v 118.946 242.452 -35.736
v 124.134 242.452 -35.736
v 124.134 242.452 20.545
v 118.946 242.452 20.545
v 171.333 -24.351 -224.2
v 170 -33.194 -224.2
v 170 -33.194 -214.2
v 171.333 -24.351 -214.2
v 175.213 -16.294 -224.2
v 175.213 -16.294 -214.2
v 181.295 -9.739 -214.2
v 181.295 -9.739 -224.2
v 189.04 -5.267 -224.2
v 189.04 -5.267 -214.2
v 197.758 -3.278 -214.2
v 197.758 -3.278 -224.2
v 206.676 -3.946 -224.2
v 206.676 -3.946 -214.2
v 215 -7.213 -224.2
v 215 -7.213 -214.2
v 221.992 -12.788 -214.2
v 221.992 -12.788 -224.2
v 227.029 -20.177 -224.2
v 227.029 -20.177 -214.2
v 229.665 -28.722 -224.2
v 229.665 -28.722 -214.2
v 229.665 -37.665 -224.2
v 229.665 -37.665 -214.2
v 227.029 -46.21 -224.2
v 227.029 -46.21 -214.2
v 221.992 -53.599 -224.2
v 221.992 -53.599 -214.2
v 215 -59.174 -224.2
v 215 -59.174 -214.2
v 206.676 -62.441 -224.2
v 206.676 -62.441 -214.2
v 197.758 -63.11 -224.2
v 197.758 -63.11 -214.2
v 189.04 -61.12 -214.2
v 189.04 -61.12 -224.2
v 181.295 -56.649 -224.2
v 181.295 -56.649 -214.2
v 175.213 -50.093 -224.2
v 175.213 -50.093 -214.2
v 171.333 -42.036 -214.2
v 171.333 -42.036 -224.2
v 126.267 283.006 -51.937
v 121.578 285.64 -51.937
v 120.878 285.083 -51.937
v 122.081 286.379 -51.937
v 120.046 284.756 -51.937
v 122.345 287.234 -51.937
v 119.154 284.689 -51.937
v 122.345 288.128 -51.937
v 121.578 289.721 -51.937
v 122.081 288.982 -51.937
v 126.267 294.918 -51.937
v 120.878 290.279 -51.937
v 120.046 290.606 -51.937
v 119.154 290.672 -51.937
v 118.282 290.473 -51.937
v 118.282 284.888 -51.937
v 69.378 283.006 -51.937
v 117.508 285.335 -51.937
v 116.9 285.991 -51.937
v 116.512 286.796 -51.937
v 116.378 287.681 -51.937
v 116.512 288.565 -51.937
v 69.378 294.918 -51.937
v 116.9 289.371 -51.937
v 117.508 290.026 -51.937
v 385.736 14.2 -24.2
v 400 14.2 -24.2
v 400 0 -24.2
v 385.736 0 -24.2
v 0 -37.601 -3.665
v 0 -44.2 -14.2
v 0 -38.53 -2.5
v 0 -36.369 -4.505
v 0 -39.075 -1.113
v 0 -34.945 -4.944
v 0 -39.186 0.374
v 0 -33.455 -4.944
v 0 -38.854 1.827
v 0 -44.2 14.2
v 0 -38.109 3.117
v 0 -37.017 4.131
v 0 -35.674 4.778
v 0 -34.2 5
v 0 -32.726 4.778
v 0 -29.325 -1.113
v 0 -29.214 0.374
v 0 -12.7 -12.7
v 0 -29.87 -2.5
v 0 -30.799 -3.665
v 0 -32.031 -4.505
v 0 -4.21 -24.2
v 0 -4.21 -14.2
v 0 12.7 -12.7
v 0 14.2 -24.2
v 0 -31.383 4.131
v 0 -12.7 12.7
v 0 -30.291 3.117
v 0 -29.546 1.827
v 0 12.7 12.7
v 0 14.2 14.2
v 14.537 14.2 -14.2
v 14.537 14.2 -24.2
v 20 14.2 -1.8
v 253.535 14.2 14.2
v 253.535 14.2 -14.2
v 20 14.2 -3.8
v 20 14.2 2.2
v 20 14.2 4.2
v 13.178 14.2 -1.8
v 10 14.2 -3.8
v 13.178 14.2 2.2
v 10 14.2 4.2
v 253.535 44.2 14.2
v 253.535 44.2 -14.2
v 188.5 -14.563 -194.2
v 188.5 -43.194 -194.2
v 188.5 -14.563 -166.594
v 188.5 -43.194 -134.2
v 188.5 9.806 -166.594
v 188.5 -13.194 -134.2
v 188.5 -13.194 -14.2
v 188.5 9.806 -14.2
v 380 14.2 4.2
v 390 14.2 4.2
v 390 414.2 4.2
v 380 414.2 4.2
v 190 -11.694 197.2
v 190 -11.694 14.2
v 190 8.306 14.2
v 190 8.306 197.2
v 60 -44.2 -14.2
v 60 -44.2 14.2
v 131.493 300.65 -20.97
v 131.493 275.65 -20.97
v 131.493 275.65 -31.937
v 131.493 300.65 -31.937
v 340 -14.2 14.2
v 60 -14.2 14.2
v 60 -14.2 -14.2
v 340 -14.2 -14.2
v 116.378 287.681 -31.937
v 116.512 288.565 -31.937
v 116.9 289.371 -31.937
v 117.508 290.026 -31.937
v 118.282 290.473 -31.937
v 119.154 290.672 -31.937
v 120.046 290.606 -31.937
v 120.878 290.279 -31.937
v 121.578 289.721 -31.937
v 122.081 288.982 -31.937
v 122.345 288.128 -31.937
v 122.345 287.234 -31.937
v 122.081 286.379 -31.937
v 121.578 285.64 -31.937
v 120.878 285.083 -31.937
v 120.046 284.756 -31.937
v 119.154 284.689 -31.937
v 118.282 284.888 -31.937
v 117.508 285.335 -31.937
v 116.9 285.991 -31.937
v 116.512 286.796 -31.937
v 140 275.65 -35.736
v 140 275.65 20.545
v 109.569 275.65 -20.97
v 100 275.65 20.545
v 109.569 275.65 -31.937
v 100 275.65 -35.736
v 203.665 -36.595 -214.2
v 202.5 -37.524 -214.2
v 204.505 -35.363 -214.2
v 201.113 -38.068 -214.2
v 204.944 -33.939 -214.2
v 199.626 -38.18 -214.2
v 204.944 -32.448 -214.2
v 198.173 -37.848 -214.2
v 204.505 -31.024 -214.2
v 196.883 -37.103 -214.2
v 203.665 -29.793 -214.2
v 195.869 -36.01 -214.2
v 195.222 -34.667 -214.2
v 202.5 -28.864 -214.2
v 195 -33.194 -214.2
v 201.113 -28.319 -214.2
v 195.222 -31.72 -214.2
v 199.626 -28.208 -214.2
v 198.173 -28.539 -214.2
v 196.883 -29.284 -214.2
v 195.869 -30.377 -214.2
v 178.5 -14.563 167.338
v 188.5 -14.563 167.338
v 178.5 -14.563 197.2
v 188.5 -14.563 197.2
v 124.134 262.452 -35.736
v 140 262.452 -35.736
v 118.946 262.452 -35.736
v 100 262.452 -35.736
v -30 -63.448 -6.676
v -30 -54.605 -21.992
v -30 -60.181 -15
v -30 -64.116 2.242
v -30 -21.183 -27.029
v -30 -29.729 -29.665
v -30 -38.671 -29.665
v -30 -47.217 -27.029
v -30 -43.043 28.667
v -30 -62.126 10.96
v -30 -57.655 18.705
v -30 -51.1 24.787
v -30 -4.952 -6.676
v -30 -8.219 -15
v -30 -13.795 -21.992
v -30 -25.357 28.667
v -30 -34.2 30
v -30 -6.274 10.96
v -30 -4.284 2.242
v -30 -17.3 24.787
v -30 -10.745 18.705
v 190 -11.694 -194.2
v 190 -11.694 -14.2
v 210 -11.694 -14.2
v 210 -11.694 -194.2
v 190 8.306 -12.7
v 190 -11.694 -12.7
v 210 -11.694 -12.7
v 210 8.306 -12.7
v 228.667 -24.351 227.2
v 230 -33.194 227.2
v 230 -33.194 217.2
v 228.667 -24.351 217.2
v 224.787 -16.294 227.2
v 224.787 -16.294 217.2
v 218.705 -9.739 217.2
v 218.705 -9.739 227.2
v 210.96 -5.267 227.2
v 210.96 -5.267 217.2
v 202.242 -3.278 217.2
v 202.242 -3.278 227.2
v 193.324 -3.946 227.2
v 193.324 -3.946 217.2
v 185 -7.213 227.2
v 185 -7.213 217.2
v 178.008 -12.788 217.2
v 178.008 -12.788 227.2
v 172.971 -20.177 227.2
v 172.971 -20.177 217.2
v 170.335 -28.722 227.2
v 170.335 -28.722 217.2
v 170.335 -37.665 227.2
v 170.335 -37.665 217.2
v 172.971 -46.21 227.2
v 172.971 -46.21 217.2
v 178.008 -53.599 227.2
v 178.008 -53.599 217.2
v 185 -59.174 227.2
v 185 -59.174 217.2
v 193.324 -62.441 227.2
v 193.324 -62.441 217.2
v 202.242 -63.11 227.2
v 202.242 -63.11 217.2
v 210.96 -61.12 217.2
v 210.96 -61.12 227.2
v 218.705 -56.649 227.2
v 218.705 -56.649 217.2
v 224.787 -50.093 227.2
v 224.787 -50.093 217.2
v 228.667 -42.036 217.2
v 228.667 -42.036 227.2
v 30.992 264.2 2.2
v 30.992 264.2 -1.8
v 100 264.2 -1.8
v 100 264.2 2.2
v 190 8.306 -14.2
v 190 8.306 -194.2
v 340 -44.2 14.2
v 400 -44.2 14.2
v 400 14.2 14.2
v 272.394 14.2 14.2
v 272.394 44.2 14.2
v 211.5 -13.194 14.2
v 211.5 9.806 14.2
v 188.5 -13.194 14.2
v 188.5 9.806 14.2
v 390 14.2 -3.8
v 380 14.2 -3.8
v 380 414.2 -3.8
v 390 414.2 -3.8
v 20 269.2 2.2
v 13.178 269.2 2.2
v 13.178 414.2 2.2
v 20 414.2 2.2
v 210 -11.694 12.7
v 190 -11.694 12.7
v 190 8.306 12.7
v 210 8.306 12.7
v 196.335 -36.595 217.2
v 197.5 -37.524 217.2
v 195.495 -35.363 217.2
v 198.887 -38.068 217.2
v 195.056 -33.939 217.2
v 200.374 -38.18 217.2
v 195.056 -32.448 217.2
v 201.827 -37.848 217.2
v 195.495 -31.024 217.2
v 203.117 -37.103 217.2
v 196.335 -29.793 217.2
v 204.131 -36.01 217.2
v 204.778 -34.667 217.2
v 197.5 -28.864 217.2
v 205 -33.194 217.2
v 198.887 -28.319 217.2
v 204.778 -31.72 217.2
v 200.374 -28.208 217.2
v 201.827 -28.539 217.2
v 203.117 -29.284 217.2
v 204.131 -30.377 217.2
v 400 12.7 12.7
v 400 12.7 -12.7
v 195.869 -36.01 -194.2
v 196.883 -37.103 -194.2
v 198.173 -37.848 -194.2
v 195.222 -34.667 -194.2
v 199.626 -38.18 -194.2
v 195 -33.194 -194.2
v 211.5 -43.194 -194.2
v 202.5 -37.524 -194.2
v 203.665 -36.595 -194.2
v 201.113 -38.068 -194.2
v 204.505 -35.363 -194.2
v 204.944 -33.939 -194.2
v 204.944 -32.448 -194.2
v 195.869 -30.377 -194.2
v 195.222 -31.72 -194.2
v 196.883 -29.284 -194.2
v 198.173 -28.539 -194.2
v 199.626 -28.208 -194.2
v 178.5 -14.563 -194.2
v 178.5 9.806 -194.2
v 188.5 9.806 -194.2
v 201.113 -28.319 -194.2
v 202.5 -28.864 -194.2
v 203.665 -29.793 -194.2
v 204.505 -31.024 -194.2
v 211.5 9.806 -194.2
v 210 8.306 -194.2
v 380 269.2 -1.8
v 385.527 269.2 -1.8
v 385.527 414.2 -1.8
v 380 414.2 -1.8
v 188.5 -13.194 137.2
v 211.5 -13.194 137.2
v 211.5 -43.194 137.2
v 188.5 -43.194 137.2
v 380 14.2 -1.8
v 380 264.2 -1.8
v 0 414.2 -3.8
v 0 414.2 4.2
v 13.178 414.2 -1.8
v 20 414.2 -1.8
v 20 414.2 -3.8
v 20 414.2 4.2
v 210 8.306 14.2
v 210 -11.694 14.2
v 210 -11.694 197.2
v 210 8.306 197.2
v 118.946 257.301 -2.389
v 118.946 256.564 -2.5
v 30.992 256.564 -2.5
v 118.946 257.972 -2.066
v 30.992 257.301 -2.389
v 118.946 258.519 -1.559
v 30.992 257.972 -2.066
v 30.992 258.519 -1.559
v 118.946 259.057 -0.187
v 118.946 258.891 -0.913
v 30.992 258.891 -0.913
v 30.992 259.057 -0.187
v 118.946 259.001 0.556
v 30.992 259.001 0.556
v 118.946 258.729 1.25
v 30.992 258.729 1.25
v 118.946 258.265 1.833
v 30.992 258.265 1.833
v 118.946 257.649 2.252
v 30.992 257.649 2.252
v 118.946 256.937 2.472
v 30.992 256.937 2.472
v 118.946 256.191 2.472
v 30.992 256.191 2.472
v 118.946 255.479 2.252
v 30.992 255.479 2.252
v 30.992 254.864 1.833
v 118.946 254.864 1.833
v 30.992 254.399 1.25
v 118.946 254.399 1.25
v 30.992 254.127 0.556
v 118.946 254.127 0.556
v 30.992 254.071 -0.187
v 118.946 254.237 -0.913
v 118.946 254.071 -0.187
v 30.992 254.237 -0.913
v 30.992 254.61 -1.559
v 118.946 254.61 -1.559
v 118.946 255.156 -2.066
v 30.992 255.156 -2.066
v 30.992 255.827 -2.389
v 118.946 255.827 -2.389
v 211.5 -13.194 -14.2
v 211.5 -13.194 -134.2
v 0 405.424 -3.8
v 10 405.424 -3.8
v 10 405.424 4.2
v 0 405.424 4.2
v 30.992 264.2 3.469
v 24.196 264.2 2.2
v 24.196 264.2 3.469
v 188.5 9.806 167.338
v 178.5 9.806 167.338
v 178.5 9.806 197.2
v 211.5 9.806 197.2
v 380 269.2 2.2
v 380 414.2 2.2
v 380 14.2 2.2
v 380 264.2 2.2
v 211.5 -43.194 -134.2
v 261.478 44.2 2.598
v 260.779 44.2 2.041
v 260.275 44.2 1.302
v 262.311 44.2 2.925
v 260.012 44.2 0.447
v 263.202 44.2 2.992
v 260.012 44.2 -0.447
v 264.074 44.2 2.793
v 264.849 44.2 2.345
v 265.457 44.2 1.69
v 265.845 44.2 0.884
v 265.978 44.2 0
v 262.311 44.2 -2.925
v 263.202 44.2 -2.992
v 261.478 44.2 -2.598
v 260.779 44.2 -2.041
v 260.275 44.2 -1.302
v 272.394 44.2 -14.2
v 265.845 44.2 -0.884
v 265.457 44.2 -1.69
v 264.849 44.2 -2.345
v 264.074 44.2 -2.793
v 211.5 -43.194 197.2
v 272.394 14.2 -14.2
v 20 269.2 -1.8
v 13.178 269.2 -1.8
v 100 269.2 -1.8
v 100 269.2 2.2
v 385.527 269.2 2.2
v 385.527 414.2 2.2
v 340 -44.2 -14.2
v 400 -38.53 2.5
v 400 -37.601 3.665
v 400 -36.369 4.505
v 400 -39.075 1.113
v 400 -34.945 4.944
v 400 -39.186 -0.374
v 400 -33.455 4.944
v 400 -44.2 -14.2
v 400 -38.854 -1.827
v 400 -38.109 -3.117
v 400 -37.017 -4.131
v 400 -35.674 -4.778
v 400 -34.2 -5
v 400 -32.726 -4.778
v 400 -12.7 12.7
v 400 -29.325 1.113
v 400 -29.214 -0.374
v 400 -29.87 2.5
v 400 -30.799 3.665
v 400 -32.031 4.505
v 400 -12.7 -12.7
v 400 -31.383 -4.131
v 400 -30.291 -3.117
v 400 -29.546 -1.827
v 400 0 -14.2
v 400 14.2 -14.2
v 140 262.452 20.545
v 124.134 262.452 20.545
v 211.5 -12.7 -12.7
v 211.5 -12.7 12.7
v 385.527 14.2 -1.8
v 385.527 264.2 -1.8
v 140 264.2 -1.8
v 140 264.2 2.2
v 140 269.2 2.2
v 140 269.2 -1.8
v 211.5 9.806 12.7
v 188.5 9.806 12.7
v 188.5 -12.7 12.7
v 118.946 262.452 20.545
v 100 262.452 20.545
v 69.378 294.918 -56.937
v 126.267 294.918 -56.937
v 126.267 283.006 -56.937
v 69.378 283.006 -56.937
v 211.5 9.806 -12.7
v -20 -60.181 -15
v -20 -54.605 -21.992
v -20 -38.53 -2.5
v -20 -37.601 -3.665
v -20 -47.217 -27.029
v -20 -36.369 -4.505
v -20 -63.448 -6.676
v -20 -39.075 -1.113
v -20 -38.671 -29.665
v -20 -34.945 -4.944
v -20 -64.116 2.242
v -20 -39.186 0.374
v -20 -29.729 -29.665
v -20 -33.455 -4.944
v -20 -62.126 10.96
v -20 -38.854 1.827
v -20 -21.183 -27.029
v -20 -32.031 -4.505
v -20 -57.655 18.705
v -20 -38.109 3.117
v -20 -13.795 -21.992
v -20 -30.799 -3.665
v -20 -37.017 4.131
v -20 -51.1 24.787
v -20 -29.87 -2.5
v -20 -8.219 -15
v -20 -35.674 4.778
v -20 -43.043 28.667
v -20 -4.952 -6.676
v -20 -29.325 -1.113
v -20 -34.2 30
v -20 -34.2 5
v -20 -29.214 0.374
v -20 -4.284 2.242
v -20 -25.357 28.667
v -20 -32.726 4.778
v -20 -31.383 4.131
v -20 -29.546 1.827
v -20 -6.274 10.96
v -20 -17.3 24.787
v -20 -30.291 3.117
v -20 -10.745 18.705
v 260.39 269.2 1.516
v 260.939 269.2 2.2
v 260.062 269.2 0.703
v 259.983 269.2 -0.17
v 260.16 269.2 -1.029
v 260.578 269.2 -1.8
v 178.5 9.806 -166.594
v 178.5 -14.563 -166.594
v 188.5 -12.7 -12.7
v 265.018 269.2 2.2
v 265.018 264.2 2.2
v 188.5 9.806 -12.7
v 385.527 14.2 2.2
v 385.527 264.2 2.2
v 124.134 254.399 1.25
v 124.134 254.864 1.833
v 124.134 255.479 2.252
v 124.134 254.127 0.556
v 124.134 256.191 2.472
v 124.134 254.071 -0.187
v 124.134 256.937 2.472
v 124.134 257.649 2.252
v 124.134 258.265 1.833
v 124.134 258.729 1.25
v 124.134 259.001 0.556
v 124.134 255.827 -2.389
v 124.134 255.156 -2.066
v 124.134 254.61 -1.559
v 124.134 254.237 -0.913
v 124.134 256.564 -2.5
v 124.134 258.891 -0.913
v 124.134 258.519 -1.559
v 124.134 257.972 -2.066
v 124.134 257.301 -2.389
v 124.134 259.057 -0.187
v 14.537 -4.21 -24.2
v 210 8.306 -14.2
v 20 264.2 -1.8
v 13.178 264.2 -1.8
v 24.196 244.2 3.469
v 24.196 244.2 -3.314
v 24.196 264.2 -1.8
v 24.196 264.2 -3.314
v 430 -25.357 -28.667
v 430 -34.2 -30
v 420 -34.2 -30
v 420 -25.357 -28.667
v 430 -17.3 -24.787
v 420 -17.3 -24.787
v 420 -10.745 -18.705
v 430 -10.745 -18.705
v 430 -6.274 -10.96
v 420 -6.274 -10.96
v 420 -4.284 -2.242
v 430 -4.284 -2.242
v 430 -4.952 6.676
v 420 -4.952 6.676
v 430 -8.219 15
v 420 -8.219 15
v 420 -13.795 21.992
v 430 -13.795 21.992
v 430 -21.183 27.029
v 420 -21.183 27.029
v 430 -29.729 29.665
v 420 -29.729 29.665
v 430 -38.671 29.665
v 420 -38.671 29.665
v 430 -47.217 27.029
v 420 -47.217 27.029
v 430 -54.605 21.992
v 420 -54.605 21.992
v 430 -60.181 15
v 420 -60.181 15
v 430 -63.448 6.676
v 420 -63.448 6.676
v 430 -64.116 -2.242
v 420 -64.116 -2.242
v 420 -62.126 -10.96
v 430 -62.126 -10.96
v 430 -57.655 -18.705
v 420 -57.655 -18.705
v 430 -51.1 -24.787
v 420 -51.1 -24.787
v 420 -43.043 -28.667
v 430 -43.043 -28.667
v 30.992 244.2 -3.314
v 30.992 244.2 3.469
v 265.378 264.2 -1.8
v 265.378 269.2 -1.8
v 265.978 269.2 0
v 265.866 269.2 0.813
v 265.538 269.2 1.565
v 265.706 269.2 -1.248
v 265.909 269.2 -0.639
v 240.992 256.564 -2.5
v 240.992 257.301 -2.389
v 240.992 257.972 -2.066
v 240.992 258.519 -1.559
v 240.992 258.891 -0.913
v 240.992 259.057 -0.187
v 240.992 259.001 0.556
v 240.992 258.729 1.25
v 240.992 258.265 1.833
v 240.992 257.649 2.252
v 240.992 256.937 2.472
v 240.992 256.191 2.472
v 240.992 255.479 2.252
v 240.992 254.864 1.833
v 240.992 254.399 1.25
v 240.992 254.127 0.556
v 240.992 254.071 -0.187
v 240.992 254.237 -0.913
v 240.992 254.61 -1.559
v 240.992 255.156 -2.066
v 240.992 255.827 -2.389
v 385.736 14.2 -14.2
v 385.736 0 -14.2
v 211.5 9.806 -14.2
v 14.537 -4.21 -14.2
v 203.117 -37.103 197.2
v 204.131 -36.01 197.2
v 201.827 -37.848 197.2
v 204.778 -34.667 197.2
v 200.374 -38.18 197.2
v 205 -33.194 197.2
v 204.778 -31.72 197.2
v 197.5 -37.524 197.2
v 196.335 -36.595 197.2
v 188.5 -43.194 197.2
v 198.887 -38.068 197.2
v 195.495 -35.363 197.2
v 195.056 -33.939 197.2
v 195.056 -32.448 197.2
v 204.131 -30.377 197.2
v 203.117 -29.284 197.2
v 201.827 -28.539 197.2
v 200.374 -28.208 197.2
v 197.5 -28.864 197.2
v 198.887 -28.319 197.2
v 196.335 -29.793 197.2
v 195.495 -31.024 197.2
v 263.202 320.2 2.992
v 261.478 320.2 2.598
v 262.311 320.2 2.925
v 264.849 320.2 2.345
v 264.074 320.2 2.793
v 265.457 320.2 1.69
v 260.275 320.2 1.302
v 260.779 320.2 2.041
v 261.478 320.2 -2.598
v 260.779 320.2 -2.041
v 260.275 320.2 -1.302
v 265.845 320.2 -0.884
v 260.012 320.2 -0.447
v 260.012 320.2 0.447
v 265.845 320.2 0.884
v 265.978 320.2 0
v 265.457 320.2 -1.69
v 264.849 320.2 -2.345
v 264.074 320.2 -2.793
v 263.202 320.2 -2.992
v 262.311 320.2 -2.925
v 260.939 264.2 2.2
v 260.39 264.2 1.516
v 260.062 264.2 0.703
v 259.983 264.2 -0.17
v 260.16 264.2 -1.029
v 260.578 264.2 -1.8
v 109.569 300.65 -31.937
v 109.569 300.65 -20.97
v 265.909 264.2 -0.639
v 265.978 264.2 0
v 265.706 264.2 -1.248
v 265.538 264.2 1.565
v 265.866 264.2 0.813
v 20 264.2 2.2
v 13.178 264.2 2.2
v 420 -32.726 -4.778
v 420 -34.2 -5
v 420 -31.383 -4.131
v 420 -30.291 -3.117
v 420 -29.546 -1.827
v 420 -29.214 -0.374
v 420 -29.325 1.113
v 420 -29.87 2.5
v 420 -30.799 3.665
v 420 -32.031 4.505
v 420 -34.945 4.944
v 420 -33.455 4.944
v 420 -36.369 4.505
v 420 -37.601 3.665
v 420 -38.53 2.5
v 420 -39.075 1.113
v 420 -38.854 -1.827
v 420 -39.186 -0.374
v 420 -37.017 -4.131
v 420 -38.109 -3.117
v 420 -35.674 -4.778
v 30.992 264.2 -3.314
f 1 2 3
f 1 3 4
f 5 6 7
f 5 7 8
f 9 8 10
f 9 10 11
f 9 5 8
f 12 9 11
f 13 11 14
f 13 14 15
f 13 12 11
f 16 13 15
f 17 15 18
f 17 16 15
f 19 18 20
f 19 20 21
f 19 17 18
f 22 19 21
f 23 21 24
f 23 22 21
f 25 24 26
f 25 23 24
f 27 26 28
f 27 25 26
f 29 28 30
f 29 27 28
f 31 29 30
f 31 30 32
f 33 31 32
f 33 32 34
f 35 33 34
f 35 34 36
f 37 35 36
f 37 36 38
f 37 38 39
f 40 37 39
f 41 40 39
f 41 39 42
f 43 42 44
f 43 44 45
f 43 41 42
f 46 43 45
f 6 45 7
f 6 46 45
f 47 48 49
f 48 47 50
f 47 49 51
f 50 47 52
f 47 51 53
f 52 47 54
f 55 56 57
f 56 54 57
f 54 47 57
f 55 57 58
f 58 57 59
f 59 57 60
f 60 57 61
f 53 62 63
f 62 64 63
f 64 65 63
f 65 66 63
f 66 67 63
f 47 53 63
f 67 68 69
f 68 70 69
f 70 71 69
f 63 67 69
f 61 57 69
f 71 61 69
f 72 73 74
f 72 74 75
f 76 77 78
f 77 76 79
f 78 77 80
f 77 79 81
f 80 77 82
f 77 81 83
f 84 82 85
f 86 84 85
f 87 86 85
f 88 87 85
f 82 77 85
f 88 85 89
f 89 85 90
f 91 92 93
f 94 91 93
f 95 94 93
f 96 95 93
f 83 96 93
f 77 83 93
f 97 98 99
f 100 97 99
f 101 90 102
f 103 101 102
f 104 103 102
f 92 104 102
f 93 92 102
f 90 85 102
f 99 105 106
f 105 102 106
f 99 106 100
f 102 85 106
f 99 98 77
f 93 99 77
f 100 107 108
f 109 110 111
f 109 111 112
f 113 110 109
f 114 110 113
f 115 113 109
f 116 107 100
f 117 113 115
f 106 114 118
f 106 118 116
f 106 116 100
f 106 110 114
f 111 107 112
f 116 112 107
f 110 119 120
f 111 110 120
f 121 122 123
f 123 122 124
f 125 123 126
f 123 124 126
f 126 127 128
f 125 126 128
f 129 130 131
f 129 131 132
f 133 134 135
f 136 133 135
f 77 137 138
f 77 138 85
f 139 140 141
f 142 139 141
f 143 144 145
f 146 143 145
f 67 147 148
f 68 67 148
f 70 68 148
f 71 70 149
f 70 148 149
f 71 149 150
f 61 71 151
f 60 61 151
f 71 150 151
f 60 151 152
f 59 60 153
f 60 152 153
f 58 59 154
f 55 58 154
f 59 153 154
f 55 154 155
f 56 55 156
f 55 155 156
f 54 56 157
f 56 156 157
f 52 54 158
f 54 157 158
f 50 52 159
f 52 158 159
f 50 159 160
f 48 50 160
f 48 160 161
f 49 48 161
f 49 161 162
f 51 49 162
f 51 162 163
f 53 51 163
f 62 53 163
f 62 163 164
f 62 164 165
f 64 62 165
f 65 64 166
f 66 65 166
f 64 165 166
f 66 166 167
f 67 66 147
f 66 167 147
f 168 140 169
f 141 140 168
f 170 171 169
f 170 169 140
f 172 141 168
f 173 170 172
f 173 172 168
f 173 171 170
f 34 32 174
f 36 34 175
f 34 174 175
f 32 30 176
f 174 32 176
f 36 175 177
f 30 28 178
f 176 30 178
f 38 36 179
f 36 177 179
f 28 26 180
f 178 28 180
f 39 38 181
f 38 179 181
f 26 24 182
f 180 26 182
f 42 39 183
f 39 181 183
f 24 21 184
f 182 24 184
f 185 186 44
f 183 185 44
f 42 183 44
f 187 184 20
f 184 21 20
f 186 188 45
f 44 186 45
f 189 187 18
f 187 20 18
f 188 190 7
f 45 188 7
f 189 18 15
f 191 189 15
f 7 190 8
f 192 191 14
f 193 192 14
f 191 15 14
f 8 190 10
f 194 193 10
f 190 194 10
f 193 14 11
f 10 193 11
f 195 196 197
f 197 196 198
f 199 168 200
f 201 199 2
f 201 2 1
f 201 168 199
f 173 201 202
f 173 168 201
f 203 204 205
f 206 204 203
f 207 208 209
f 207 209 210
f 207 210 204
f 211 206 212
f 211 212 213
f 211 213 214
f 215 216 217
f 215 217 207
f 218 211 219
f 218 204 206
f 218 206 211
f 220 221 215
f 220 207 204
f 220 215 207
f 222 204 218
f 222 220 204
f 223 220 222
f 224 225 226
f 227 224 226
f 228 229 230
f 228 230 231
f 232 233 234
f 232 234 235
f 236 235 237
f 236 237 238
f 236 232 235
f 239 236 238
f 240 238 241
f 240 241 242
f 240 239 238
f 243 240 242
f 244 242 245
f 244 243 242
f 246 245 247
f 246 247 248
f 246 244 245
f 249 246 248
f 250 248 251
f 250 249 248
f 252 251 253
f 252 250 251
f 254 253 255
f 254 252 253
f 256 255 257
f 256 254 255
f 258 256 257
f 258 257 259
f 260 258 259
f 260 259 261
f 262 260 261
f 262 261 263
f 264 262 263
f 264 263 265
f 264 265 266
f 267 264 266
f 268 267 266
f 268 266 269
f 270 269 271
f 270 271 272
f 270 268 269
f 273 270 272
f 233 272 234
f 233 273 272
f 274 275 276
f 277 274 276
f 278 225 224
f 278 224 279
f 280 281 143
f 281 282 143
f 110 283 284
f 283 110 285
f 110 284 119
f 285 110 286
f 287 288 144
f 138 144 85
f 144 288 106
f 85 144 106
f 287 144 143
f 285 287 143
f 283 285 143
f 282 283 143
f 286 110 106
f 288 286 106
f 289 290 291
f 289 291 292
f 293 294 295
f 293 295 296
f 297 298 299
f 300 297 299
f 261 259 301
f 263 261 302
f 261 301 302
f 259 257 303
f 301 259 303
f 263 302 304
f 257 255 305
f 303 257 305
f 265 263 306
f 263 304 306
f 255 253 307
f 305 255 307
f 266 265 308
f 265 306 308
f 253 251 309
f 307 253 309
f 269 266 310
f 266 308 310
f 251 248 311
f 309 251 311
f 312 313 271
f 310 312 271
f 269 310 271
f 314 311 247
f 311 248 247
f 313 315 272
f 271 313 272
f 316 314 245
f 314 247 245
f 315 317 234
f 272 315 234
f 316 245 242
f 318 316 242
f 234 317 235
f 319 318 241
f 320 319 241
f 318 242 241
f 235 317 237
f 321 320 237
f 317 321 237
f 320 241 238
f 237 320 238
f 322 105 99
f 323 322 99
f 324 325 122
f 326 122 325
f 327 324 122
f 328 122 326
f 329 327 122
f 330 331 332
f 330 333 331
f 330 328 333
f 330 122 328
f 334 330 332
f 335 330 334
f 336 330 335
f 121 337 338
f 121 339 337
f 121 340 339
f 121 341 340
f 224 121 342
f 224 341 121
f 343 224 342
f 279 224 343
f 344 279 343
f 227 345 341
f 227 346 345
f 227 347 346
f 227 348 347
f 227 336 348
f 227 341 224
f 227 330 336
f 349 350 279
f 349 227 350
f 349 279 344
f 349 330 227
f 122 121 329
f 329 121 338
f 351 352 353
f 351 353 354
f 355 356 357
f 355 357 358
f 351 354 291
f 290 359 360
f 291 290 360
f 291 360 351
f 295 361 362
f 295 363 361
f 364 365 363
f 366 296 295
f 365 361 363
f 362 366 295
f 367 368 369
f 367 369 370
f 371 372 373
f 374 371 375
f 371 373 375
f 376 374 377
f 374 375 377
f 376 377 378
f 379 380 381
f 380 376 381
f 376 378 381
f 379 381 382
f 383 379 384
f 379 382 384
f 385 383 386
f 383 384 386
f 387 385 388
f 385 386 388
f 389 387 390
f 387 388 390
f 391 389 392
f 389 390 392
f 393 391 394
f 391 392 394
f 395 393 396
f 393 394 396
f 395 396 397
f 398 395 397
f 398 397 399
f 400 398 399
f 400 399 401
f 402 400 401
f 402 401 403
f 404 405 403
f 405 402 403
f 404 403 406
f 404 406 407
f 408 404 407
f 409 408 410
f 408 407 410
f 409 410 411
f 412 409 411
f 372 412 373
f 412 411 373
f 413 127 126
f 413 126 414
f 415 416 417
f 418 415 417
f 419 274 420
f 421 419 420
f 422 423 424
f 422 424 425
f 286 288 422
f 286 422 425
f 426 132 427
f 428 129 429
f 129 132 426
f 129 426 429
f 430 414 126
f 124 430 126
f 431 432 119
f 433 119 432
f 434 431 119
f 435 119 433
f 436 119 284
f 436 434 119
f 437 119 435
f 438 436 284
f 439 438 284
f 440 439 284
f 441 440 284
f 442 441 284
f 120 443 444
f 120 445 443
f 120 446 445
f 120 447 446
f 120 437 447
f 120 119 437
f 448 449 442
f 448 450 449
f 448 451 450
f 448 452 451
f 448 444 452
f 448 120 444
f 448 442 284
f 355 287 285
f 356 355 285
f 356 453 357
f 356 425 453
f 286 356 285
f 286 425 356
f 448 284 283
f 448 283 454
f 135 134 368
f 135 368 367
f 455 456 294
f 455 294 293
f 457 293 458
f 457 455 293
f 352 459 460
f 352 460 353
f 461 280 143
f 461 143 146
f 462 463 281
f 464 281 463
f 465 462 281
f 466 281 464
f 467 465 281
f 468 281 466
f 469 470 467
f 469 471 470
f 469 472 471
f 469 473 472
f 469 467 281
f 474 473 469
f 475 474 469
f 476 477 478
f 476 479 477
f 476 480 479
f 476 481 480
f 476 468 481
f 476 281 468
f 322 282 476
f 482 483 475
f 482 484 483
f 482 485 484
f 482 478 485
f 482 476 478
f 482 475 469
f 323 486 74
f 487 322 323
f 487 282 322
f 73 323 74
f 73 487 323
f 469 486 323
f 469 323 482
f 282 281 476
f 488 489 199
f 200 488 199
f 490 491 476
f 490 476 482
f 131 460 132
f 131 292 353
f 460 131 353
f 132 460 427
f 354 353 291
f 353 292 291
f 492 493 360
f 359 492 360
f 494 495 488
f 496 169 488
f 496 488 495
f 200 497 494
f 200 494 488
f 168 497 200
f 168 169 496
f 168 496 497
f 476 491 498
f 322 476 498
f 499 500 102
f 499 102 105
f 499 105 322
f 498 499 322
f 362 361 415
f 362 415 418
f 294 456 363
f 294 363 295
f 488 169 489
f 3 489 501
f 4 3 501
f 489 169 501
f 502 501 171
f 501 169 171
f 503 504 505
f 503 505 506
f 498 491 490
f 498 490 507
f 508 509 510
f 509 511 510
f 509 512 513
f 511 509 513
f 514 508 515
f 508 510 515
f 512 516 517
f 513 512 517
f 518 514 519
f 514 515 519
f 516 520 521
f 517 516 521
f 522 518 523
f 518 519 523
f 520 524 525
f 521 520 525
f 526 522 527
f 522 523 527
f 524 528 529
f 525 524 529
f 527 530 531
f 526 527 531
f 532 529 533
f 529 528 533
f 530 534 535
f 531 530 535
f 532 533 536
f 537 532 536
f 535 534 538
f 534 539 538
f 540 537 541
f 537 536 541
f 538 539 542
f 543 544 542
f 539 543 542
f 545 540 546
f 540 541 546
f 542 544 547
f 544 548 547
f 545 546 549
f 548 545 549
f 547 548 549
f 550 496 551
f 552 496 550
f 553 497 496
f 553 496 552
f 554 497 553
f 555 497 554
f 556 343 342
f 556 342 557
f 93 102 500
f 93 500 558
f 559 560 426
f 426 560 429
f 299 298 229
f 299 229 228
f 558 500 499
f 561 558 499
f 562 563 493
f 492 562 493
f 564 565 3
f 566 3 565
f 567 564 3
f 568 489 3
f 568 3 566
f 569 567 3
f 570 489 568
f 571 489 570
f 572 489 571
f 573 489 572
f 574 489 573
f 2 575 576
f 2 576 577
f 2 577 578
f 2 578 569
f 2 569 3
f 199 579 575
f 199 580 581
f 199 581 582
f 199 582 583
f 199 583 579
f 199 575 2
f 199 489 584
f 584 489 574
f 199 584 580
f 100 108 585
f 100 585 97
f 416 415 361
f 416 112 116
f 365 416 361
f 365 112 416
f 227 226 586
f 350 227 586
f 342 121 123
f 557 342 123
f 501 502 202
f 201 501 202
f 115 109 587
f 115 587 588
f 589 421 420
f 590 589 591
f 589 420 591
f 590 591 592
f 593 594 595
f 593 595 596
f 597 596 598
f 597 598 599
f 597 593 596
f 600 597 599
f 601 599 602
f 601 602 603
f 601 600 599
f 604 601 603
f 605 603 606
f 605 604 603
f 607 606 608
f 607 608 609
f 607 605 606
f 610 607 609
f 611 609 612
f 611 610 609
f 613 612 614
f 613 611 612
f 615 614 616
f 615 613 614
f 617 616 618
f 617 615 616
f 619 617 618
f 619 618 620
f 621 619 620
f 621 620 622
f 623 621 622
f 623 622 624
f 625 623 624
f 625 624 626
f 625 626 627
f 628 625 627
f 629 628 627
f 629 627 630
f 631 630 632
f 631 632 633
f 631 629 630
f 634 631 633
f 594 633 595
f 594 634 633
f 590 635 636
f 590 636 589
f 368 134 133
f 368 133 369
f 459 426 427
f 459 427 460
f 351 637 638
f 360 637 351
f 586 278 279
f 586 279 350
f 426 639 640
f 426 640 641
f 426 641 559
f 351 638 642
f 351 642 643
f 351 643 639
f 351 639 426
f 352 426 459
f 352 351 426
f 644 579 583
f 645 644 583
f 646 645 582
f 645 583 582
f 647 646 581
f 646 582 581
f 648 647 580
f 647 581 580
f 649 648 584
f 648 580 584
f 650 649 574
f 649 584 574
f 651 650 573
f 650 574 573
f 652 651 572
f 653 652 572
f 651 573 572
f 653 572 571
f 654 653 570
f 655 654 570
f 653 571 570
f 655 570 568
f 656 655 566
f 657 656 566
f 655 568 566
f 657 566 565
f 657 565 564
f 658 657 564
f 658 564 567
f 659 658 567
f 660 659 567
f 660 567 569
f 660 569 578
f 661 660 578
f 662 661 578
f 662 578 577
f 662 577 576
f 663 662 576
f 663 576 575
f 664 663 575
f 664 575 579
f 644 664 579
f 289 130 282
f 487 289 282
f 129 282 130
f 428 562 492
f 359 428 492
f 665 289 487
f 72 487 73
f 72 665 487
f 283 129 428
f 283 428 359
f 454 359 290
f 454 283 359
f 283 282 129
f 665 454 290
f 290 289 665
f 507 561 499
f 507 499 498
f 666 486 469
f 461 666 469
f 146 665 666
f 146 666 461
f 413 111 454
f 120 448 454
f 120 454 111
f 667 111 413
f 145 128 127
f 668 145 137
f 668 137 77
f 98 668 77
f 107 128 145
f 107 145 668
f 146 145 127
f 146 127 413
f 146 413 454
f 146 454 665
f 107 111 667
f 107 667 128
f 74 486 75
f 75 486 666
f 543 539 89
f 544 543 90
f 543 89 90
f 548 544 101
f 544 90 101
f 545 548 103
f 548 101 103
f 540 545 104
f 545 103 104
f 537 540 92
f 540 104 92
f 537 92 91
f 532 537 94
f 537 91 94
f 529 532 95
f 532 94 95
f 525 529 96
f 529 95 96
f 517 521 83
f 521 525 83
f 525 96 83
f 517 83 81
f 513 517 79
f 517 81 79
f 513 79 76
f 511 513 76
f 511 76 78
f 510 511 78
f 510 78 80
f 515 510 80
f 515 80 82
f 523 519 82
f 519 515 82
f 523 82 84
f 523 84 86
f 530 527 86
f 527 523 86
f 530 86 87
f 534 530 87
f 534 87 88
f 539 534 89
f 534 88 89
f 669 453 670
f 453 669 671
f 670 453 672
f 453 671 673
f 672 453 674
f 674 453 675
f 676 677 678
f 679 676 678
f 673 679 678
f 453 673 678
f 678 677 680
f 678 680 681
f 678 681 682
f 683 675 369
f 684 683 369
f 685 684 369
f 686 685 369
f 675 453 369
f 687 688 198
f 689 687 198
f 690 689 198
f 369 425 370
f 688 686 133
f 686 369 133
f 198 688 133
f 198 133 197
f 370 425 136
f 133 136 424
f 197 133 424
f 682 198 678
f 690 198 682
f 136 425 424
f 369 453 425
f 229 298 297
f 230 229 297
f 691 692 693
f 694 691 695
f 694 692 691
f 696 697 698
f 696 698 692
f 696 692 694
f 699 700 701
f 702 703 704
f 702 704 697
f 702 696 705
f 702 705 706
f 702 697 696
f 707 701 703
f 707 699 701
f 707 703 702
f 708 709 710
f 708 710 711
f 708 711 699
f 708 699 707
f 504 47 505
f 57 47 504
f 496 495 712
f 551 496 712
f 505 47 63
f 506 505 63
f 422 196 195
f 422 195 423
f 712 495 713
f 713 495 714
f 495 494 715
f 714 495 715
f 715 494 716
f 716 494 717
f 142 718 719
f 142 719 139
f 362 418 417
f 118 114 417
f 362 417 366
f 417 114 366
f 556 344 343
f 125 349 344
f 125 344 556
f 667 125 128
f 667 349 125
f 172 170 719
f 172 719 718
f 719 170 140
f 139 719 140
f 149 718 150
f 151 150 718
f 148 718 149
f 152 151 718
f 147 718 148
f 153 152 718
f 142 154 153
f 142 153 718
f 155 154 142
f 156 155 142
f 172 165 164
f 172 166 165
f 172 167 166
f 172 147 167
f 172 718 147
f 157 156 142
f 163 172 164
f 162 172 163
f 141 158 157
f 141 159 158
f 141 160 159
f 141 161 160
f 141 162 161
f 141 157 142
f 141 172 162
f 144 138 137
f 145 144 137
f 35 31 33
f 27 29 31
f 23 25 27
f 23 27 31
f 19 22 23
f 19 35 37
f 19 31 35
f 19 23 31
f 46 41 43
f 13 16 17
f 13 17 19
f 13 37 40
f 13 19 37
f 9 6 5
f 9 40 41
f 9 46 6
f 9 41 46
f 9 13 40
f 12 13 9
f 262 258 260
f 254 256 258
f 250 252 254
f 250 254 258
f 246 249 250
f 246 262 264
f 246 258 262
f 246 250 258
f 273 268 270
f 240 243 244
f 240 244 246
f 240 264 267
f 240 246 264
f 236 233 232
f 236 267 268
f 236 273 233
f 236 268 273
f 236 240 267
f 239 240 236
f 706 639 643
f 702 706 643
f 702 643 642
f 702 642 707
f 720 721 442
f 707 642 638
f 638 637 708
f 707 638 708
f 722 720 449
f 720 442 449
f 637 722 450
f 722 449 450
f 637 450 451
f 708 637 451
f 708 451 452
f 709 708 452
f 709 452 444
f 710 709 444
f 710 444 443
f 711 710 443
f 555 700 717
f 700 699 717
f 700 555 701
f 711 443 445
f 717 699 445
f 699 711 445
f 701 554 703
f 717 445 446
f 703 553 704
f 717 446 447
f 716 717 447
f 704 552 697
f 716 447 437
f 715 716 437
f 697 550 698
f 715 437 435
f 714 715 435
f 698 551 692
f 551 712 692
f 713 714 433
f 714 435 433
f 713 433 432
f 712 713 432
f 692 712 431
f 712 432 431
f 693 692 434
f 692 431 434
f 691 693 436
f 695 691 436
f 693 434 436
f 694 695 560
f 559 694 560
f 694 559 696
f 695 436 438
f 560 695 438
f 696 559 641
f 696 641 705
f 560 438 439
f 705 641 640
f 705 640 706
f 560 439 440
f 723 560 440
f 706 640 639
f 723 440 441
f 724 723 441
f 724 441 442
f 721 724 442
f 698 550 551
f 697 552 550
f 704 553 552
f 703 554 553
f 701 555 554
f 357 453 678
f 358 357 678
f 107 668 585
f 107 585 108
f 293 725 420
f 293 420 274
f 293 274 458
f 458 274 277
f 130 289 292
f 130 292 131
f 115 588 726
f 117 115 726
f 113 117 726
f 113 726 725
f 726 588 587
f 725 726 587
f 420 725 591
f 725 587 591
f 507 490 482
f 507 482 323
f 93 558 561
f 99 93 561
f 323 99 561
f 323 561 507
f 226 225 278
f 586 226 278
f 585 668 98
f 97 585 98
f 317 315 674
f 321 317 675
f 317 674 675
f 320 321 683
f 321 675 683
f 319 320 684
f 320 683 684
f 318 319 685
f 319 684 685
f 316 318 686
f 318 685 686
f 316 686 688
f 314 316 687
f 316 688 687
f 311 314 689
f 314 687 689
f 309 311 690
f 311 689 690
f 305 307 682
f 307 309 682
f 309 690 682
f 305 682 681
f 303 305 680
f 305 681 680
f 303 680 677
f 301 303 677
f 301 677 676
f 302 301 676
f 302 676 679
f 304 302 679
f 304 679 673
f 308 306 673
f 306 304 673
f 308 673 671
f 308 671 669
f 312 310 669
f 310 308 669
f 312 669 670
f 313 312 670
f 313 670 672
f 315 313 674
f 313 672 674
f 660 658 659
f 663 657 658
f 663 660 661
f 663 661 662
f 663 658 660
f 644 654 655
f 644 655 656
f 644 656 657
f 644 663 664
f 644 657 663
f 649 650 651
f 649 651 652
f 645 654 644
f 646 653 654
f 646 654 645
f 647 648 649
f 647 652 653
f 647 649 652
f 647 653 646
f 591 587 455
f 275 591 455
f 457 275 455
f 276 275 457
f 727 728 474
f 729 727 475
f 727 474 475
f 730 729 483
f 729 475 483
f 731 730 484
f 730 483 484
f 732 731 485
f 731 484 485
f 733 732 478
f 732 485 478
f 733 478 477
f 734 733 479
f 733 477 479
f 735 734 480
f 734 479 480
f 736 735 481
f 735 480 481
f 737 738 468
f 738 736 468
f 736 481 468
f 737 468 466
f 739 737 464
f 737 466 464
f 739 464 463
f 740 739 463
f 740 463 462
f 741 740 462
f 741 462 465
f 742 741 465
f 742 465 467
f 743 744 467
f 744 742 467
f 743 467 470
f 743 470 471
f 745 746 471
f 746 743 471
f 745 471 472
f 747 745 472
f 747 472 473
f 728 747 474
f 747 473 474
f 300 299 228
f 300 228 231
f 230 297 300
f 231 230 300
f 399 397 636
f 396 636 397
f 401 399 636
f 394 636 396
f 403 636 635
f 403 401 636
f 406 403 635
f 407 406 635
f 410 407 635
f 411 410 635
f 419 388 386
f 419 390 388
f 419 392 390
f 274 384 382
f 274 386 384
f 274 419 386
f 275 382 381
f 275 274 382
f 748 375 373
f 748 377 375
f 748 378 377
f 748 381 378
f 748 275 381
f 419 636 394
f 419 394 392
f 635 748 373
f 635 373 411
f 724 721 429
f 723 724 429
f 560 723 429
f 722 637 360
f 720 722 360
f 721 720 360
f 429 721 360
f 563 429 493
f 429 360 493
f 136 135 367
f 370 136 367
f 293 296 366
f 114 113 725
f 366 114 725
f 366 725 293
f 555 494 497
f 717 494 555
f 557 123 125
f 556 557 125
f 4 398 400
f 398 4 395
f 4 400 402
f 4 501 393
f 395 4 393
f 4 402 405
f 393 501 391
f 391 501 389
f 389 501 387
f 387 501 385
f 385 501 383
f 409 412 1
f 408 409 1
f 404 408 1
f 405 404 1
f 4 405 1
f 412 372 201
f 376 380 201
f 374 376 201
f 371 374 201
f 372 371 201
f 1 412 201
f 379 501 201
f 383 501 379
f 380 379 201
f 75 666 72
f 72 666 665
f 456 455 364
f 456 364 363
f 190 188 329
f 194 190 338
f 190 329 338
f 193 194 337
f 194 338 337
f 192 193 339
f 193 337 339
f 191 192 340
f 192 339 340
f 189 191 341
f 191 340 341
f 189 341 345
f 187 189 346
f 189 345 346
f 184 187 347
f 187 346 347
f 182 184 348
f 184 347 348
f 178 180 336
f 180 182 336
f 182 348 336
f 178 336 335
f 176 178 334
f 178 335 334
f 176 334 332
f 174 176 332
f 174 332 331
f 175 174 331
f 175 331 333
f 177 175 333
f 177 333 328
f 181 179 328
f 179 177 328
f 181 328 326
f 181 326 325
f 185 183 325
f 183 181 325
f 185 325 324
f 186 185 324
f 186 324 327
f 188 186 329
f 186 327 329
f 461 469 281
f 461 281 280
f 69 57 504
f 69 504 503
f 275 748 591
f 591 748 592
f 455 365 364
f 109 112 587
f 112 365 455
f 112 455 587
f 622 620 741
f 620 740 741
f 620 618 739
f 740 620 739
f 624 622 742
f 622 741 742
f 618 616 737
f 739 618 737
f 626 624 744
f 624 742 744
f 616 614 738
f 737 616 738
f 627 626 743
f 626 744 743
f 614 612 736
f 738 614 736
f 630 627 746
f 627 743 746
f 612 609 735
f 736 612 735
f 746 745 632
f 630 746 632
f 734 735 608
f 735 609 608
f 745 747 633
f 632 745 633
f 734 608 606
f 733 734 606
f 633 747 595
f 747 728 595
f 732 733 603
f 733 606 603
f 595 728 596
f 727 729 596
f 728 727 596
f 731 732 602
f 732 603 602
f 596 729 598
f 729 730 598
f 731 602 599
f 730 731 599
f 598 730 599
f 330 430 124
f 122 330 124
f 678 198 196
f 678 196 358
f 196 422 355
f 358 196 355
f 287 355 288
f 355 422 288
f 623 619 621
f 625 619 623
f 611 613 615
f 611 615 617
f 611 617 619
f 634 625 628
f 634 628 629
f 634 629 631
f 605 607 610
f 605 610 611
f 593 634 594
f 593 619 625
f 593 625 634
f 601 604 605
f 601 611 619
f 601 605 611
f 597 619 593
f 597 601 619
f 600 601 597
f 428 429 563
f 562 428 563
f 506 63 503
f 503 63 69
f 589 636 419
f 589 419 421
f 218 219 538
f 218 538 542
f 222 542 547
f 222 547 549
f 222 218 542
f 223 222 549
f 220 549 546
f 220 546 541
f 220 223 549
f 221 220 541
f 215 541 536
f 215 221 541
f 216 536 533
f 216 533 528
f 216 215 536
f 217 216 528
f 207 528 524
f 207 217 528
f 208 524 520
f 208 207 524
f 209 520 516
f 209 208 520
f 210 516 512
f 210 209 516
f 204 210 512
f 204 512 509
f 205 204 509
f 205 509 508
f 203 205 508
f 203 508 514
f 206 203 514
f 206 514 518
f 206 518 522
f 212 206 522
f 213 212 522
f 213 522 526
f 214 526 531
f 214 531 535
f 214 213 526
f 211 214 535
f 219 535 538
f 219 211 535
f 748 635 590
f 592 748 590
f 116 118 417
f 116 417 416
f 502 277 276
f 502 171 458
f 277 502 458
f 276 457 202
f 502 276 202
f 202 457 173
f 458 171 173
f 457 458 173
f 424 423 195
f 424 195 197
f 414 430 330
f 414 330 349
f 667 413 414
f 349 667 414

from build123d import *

# Parameters (mm, degrees)
SKETCH1_W                = 28.4
SKETCH1_H                = 28.4
SKETCH1_W_2              = 25.4
SKETCH1_H_2              = 25.4
EXTRUDE_THIN1_DEPTH      = 400
SKETCH2_W                = 23
SKETCH2_H                = 23
SKETCH2_W_2              = 20
SKETCH2_H_2              = 20
EXTRUDE_THIN2_DEPTH      = 183
EXTRUDE_THIN2_DEPTH_BACK = 208.4
SKETCH3_W                = 60
SKETCH3_H                = 28.4
BOSS_EXTRUDE1_DEPTH      = 30
SKETCH4_W                = 23
SKETCH4_H                = 60
BOSS_EXTRUDE2_DEPTH      = 30
SKETCH5_R                = 5
BOSS_EXTRUDE3_DEPTH      = 30
SKETCH6_R                = 5
BOSS_EXTRUDE4_DEPTH      = 30
SKETCH7_R                = 5
BOSS_EXTRUDE5_DEPTH      = 30
SKETCH8_R                = 5
BOSS_EXTRUDE6_DEPTH      = 30
BOSS_EXTRUDE7_DEPTH      = 400
SKETCH10_W               = 372.349277715
SKETCH10_H               = 4
BOSS_EXTRUDE8_DEPTH      = 5
SKETCH24_R               = 30
BOSS_EXTRUDE20_DEPTH     = 10
SKETCH25_R               = 30
BOSS_EXTRUDE21_DEPTH     = 10
SKETCH26_R               = 30
BOSS_EXTRUDE22_DEPTH     = 10
SKETCH27_R               = 30
BOSS_EXTRUDE23_DEPTH     = 10
SKETCH28_W               = 18.859227369
SKETCH28_H               = 28.4
BOSS_EXTRUDE24_DEPTH     = 30
SKETCH29_R               = 3
BOSS_EXTRUDE25_DEPTH     = 276
SKETCH30_W               = 56.280454212
SKETCH30_H               = 13.197921903
BOSS_EXTRUDE26_DEPTH     = 40
SKETCH31_W               = 6.795939819
SKETCH31_H               = 6.783661409
BOSS_EXTRUDE27_DEPTH     = 20
SKETCH32_R               = 2.5
BOSS_EXTRUDE28_DEPTH     = 210
SKETCH33_W               = 5.188291065
SKETCH33_H               = 56.280454212
BOSS_EXTRUDE29_DEPTH     = 20
SKETCH34_W               = 21.924689073
SKETCH34_H               = 10.967349769
BOSS_EXTRUDE30_DEPTH     = 25
SKETCH35_R               = 3
BOSS_EXTRUDE31_DEPTH     = 20
SKETCH36_W               = 56.888194478
SKETCH36_H               = 11.912179608
BOSS_EXTRUDE32_DEPTH     = 5
SKETCH37_W               = 8
SKETCH37_H               = 8.77554695
BOSS_EXTRUDE33_DEPTH     = 10
SKETCH38_W               = 27.606480259
SKETCH38_H               = 24.3695053
SKETCH38_W_2             = 29.861732126
BOSS_EXTRUDE34_DEPTH     = 10
SKETCH39_W               = 14.536900962
SKETCH39_H               = 18.409696894
SKETCH39_W_2             = 14.264364069
SKETCH39_H_2             = 14.2
BOSS_EXTRUDE35_DEPTH     = 10


with BuildPart() as part:
    # Sketch1 → Extrude-Thin1 (new body)
    with BuildSketch(Plane(origin=(0, 0, 0), x_dir=(0, 0, -1), z_dir=(1, 0, 0))):
        Rectangle(SKETCH1_W, SKETCH1_H)
        Rectangle(SKETCH1_W_2, SKETCH1_H_2, mode=Mode.SUBTRACT)
    extrude(amount=EXTRUDE_THIN1_DEPTH)

    # Sketch2 → Extrude-Thin2 (add, two sides)
    with BuildSketch(Plane.XY.offset(14.2)) as extrude_thin2_sk:
        with Locations((200, -1.693644648)):
            Rectangle(SKETCH2_W, SKETCH2_H)
        with Locations((200, -1.693644648)):
            Rectangle(SKETCH2_W_2, SKETCH2_H_2, mode=Mode.SUBTRACT)
    extrude(amount=EXTRUDE_THIN2_DEPTH)
    extrude(extrude_thin2_sk.sketch, amount=-EXTRUDE_THIN2_DEPTH_BACK)

    # Sketch3 → Boss-Extrude1 (add)
    with BuildSketch(Plane(origin=(0, -14.2, 0), x_dir=(-1, 0, 0), z_dir=(0, -1, 0))):
        with Locations((-370, 0)):
            Rectangle(SKETCH3_W, SKETCH3_H)
        with Locations((-30, 0)):
            Rectangle(SKETCH3_W, SKETCH3_H)
    extrude(amount=BOSS_EXTRUDE1_DEPTH)

    # Sketch4 → Boss-Extrude2 (add)
    with BuildSketch(Plane(origin=(0, -13.193644648, 0), x_dir=(-1, 0, 0), z_dir=(0, -1, 0))):
        with Locations((-200, -167.2)):
            Rectangle(SKETCH4_W, SKETCH4_H)
        with Locations((-200, 164.2)):
            Rectangle(SKETCH4_W, SKETCH4_H)
    extrude(amount=BOSS_EXTRUDE2_DEPTH)

    # Sketch5 → Boss-Extrude3 (add)
    with BuildSketch(Plane(origin=(400, 0, 0), x_dir=(0, 0, -1), z_dir=(1, 0, 0))):
        with Locations((0, -34.2)):
            Circle(SKETCH5_R)
    extrude(amount=BOSS_EXTRUDE3_DEPTH)

    # Sketch6 → Boss-Extrude4 (add)
    with BuildSketch(Plane(origin=(0, 0, -194.2), x_dir=(-1, 0, 0), z_dir=(0, 0, -1))):
        with Locations((-200, -33.193644648)):
            Circle(SKETCH6_R)
    extrude(amount=BOSS_EXTRUDE4_DEPTH)

    # Sketch7 → Boss-Extrude5 (add)
    with BuildSketch(Plane.ZY):
        with Locations((0, -34.2)):
            Circle(SKETCH7_R)
    extrude(amount=BOSS_EXTRUDE5_DEPTH)

    # Sketch8 → Boss-Extrude6 (add)
    with BuildSketch(Plane.XY.offset(197.2)):
        with Locations((200, -33.193644648)):
            Circle(SKETCH8_R)
    extrude(amount=BOSS_EXTRUDE6_DEPTH)

    # Sketch9 → Boss-Extrude7 (add)
    with BuildSketch(Plane(origin=(0, 14.2, 0), x_dir=(1, 0, 0), z_dir=(0, 1, 0))):
        Polygon((10, 3.8), (20, 3.8), (20, 1.8), (13.177515759, 1.8), (13.177515759, -2.2), (20, -2.2), (20, -4.2), (10, -4.2), align=None)
        Polygon((380, 3.8), (390, 3.8), (390, -4.2), (380, -4.2), (380, -2.2), (385.526793474, -2.2), (385.526793474, 1.8), (380, 1.8), align=None)
    extrude(amount=BOSS_EXTRUDE7_DEPTH)

    # Sketch10 → Boss-Extrude8 (add)
    with BuildSketch(Plane(origin=(0, 264.2, 0), x_dir=(1, 0, 0), z_dir=(0, 1, 0))):
        with Locations((199.352154617, -0.2)):
            Rectangle(SKETCH10_W, SKETCH10_H)
    extrude(amount=BOSS_EXTRUDE8_DEPTH)

    # Sketch24 → Boss-Extrude20 (add)
    with BuildSketch(Plane(origin=(0, 0, -224.2), x_dir=(-1, 0, 0), z_dir=(0, 0, -1))):
        with Locations((-200, -33.193644648)):
            Circle(SKETCH24_R)
    extrude(amount=-BOSS_EXTRUDE20_DEPTH)

    # Sketch25 → Boss-Extrude21 (add)
    with BuildSketch(Plane.ZY.offset(30)):
        with Locations((0, -34.2)):
            Circle(SKETCH25_R)
    extrude(amount=-BOSS_EXTRUDE21_DEPTH)

    # Sketch26 → Boss-Extrude22 (add)
    with BuildSketch(Plane.XY.offset(227.2)):
        with Locations((200, -33.193644648)):
            Circle(SKETCH26_R)
    extrude(amount=-BOSS_EXTRUDE22_DEPTH)

    # Sketch27 → Boss-Extrude23 (add)
    with BuildSketch(Plane(origin=(430, 0, 0), x_dir=(0, 0, -1), z_dir=(1, 0, 0))):
        with Locations((0, -34.2)):
            Circle(SKETCH27_R)
    extrude(amount=-BOSS_EXTRUDE23_DEPTH)

    # Sketch28 → Boss-Extrude24 (add)
    with BuildSketch(Plane(origin=(0, 14.2, 0), x_dir=(1, 0, 0), z_dir=(0, 1, 0))):
        with Locations((262.964436909, 0)):
            Rectangle(SKETCH28_W, SKETCH28_H)
    extrude(amount=BOSS_EXTRUDE24_DEPTH)

    # Sketch29 → Boss-Extrude25 (add)
    with BuildSketch(Plane(origin=(0, 44.2, 0), x_dir=(1, 0, 0), z_dir=(0, 1, 0))):
        with Locations((262.978152894, 0)):
            Circle(SKETCH29_R)
    extrude(amount=BOSS_EXTRUDE25_DEPTH)

    # Sketch30 → Boss-Extrude26 (add)
    with BuildSketch(Plane(origin=(100, 0, 0), x_dir=(0, 0, -1), z_dir=(1, 0, 0))):
        with Locations((7.595285017, 269.051232914)):
            Rectangle(SKETCH30_W, SKETCH30_H)
    extrude(amount=BOSS_EXTRUDE26_DEPTH)

    # Sketch31 → Boss-Extrude27 (add)
    with BuildSketch(Plane(origin=(0, 264.2, 0), x_dir=(-1, 0, 0), z_dir=(0, -1, 0))):
        with Locations((-27.594001553, -0.077336563)):
            Rectangle(SKETCH31_W, SKETCH31_H)
    extrude(amount=BOSS_EXTRUDE27_DEPTH)

    # Sketch32 → Boss-Extrude28 (add)
    with BuildSketch(Plane(origin=(30.991971462, 0, 0), x_dir=(0, 0, -1), z_dir=(1, 0, 0))):
        with Locations((0, 256.564095002)):
            Circle(SKETCH32_R)
    extrude(amount=BOSS_EXTRUDE28_DEPTH)

    # Sketch33 → Boss-Extrude29 (add)
    with BuildSketch(Plane(origin=(0, 262.452271962, 0), x_dir=(-1, 0, 0), z_dir=(0, -1, 0))):
        with Locations((-121.53991064, 7.595285017)):
            Rectangle(SKETCH33_W, SKETCH33_H)
    extrude(amount=BOSS_EXTRUDE29_DEPTH)

    # Sketch34 → Boss-Extrude30 (add)
    with BuildSketch(Plane(origin=(0, 275.650193865, 0), x_dir=(1, 0, 0), z_dir=(0, 1, 0))):
        with Locations((120.531111369, 26.453283936)):
            Rectangle(SKETCH34_W, SKETCH34_H)
    extrude(amount=BOSS_EXTRUDE30_DEPTH)

    # Sketch35 → Boss-Extrude31 (add)
    with BuildSketch(Plane(origin=(0, 0, -31.93695882), x_dir=(-1, 0, 0), z_dir=(0, 0, -1))):
        with Locations((-119.378398528, 287.680723614)):
            Circle(SKETCH35_R)
    extrude(amount=BOSS_EXTRUDE31_DEPTH)

    # Sketch36 → Boss-Extrude32 (add)
    with BuildSketch(Plane(origin=(0, 0, -51.93695882), x_dir=(-1, 0, 0), z_dir=(0, 0, -1))):
        with Locations((-97.822495767, 288.961624672)):
            Rectangle(SKETCH36_W, SKETCH36_H)
    extrude(amount=BOSS_EXTRUDE32_DEPTH)

    # Sketch37 → Boss-Extrude33 (add)
    with BuildSketch(Plane.ZY.offset(-10)):
        with Locations((0.2, 409.812226525)):
            Rectangle(SKETCH37_W, SKETCH37_H)
    extrude(amount=BOSS_EXTRUDE33_DEPTH)

    # Sketch38 → Boss-Extrude34 (add)
    with BuildSketch(Plane.ZY.offset(-188.5)):
        with Locations((-180.396759871, -2.378397298)):
            Rectangle(SKETCH38_W, SKETCH38_H)
        with Locations((182.269133937, -2.378397298)):
            Rectangle(SKETCH38_W_2, SKETCH38_H)
    extrude(amount=BOSS_EXTRUDE34_DEPTH)

    # Sketch39 → Boss-Extrude35 (add)
    with BuildSketch(Plane(origin=(0, 0, -14.2), x_dir=(-1, 0, 0), z_dir=(0, 0, -1))):
        with Locations((-7.268450481, 4.995151553)):
            Rectangle(SKETCH39_W, SKETCH39_H)
        with Locations((-392.867817966, 7.1)):
            Rectangle(SKETCH39_W_2, SKETCH39_H_2)
    extrude(amount=BOSS_EXTRUDE35_DEPTH)


solid = part.part
